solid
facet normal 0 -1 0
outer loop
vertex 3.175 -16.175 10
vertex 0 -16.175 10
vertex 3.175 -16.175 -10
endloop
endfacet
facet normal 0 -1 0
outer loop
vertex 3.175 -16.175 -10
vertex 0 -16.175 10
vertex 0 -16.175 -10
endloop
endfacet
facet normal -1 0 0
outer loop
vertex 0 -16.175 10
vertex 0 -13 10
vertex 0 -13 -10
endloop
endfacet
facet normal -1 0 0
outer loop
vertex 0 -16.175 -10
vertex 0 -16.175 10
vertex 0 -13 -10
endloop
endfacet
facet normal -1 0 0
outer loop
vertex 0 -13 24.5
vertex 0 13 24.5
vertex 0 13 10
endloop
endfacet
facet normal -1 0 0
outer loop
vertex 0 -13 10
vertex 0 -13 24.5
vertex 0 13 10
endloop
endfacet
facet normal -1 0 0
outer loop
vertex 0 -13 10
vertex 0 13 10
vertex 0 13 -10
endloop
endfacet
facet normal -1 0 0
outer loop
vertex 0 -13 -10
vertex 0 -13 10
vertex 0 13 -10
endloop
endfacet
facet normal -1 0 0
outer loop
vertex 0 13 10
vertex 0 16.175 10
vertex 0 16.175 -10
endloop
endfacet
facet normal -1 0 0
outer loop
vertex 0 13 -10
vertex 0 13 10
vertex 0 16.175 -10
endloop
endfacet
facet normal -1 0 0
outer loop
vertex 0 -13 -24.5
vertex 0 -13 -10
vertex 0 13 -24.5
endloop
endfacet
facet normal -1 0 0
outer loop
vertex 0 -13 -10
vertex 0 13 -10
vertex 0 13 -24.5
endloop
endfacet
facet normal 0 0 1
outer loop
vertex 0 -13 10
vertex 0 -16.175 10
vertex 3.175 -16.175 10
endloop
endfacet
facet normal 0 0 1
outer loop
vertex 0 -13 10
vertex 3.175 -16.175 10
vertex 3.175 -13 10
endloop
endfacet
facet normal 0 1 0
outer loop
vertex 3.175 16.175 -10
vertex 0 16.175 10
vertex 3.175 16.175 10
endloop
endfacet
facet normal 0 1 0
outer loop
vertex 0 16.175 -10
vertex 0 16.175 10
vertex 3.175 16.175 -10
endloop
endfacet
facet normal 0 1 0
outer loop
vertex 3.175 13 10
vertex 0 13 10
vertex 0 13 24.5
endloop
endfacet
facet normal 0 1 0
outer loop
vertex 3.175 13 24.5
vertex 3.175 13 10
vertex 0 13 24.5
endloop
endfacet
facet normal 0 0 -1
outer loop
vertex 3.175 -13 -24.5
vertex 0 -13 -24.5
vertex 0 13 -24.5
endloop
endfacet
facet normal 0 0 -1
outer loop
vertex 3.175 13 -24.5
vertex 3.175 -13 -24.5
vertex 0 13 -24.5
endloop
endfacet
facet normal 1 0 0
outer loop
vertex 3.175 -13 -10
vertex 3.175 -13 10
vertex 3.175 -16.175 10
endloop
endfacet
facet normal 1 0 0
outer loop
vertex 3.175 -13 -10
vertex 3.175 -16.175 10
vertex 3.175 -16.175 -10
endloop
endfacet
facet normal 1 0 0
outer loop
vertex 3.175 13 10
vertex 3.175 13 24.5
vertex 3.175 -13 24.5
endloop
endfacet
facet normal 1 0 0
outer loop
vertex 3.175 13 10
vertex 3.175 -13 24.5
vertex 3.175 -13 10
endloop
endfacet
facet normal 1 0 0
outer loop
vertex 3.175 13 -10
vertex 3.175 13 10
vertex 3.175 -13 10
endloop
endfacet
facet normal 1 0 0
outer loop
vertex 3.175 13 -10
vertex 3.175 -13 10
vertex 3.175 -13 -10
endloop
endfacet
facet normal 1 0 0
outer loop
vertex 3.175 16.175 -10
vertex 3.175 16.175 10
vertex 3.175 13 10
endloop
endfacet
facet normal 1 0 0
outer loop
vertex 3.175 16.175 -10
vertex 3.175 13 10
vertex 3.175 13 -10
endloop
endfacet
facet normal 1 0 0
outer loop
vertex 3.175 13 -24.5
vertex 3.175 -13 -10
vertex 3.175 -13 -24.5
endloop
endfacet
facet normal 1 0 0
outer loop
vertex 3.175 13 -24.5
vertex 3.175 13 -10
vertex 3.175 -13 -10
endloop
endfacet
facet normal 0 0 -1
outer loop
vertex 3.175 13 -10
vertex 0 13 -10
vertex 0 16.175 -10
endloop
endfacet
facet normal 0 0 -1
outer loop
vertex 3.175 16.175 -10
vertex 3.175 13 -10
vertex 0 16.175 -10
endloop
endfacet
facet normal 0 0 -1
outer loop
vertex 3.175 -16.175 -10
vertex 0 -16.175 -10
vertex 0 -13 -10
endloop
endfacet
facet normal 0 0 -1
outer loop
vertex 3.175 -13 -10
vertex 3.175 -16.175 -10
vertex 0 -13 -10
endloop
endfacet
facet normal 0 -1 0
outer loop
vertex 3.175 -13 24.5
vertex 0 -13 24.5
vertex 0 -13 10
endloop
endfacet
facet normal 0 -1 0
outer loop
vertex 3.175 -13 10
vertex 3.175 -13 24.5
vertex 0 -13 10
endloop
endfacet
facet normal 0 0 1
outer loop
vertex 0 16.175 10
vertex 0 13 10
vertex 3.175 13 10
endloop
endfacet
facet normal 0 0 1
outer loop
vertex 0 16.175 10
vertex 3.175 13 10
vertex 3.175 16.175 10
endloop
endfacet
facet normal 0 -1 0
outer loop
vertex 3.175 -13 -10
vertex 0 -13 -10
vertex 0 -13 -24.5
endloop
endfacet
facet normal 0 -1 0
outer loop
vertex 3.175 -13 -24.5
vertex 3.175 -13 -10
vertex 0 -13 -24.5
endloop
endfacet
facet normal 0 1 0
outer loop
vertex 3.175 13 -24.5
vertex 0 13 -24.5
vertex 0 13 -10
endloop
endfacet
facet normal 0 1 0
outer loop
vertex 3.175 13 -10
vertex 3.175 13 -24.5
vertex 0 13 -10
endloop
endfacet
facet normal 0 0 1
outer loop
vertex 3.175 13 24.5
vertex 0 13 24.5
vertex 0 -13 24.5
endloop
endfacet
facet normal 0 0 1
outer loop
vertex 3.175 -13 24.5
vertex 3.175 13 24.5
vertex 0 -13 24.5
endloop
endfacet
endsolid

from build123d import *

# Parameters (mm, degrees)
SKETCH1_W           = 20
SKETCH1_H           = 3.175
BOSS_EXTRUDE1_DEPTH = 3.175


with BuildPart() as part:
    # Sketch1 → Boss-Extrude1 (new body)
    with BuildSketch(Plane(origin=(0, 0, 0), x_dir=(0, 0, -1), z_dir=(1, 0, 0))):
        with Locations((0, 14.5875)):
            Rectangle(SKETCH1_W, SKETCH1_H)
        Polygon((-24.5, 13), (-24.5, -13), (-10, -13), (10, -13), (24.5, -13), (24.5, 13), (10, 13), (-10, 13), align=None)
        with Locations((0, -14.5875)):
            Rectangle(SKETCH1_W, SKETCH1_H)
    extrude(amount=BOSS_EXTRUDE1_DEPTH)


solid = part.part
